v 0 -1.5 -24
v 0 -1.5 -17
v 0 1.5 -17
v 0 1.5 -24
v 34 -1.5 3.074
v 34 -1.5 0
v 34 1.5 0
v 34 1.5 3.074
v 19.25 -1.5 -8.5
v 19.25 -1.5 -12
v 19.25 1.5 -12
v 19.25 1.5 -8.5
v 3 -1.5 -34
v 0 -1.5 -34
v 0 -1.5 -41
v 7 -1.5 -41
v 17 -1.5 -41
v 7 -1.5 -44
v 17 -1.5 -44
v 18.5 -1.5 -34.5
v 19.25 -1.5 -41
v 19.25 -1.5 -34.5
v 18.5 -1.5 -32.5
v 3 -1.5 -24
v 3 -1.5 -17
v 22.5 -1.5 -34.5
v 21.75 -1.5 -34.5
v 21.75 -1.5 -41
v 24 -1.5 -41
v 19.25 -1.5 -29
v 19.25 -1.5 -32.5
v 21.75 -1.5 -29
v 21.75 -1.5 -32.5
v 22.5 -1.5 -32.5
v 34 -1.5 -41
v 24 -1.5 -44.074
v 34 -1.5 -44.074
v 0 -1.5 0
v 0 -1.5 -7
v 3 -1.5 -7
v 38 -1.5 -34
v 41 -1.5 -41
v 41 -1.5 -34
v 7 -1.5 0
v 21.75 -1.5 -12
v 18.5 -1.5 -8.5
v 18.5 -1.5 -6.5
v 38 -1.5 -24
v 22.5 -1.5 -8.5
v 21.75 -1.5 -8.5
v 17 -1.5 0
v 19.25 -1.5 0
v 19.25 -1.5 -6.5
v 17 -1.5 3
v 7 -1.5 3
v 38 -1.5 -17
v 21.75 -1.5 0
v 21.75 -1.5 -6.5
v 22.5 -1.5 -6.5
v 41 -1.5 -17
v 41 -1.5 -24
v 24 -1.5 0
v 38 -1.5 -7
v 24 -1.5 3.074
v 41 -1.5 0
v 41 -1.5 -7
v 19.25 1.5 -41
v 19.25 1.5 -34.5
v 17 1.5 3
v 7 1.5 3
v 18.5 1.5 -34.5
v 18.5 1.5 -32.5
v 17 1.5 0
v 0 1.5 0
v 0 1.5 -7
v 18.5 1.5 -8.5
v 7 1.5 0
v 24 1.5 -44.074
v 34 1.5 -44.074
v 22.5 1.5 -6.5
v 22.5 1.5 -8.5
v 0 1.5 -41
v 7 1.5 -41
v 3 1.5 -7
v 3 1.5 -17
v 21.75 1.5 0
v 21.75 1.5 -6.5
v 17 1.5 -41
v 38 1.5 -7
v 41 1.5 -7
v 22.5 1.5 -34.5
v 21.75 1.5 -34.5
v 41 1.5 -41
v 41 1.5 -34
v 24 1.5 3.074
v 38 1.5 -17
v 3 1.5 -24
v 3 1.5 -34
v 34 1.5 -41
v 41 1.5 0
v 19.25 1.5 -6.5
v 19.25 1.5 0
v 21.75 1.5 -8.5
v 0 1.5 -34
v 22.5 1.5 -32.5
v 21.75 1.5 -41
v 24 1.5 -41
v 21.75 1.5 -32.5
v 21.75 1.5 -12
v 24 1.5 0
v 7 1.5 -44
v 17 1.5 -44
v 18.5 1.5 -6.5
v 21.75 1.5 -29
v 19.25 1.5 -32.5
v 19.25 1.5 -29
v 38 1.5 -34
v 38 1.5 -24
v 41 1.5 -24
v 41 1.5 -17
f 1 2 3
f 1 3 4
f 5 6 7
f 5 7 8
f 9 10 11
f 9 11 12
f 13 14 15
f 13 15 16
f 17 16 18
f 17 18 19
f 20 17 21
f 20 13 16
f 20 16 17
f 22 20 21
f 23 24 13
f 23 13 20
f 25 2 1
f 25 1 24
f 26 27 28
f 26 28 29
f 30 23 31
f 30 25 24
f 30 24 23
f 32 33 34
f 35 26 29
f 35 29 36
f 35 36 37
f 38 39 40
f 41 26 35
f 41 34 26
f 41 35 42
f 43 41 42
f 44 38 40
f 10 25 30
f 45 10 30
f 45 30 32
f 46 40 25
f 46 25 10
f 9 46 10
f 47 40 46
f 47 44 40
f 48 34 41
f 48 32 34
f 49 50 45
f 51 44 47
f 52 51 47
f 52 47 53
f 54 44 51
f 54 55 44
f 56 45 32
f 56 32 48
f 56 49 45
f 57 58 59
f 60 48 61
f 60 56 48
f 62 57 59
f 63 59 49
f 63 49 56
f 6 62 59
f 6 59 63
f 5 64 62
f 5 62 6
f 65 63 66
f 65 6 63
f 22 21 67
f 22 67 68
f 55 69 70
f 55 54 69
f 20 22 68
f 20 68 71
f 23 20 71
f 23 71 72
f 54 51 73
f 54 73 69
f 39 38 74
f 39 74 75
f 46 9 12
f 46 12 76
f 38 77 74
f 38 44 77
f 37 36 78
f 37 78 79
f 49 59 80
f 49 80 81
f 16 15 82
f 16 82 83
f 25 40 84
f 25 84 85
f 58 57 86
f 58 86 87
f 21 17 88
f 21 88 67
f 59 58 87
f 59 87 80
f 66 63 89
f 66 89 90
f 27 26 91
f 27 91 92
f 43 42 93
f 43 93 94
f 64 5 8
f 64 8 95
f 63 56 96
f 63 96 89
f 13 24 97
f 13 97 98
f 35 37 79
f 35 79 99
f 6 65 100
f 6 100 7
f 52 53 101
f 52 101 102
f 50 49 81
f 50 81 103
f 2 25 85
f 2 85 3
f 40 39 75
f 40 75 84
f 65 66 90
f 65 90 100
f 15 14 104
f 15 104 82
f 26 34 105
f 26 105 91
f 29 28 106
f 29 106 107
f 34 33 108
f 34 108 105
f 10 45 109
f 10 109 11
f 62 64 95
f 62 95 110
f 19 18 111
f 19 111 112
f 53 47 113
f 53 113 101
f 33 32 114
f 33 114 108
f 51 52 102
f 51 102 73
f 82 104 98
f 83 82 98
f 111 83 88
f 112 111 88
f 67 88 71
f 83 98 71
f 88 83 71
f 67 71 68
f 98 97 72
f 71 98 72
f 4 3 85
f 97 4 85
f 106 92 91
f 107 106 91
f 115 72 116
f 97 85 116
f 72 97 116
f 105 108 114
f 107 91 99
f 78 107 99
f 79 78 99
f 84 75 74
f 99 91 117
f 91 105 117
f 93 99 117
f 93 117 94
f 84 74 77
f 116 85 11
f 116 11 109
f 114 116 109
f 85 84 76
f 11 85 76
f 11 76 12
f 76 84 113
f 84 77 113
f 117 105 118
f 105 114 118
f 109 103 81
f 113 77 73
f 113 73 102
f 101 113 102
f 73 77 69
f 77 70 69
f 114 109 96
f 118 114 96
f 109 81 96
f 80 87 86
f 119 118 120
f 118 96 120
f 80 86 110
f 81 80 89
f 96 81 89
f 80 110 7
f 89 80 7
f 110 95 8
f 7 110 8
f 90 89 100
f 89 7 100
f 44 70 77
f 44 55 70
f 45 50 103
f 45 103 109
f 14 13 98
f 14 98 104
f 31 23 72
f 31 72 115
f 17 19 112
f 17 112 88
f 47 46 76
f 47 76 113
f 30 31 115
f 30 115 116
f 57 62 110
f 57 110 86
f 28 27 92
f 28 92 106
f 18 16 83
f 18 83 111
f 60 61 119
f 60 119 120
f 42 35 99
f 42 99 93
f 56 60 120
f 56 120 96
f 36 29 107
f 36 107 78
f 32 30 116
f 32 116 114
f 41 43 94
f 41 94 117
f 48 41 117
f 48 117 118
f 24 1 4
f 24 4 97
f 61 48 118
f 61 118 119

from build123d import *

# Parameters (mm, degrees)
F1_DEPTH = 1.5


with BuildPart() as f1:
    # F0 (on Front) → F1 (new body, symmetric)
    with BuildSketch(Plane.XZ):
        Polygon((7, 0), (0, 0), (0, -7), (3, -7), (3, -17), (0, -17), (0, -24), (3, -24), (3, -34), (0, -34), (0, -41), (7, -41), (7, -44), (17, -44), (17, -41), (19.25, -41), (19.25, -34.5), (18.5, -34.5), (18.5, -32.5), (19.25, -32.5), (19.25, -29), (21.75, -29), (21.75, -32.5), (22.5, -32.5), (22.5, -34.5), (21.75, -34.5), (21.75, -41), (24, -41), (24, -44.073563), (34, -44.073563), (34, -41), (41, -41), (41, -34), (38, -34), (38, -24), (41, -24), (41, -17), (38, -17), (38, -7), (41, -7), (41, 0), (34, 0), (34, 3.073563), (24, 3.073563), (24, 0), (21.75, 0), (21.75, -6.5), (22.5, -6.5), (22.5, -8.5), (21.75, -8.5), (21.75, -12), (19.25, -12), (19.25, -8.5), (18.5, -8.5), (18.5, -6.5), (19.25, -6.5), (19.25, 0), (17, 0), (17, 3), (7, 3), align=None)
    extrude(amount=F1_DEPTH, both=True)


solid = f1.part
